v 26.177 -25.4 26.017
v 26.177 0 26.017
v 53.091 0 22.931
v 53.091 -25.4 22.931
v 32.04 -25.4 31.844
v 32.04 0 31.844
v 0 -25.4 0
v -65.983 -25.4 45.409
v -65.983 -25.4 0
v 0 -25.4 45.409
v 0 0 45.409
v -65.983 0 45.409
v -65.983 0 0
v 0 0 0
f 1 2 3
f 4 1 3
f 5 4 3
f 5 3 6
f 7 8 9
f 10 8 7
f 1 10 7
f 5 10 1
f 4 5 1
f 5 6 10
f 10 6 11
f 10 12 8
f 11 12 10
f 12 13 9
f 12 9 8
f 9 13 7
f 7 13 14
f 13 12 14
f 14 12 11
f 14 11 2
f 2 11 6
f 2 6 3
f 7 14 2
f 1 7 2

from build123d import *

# Parameters (mm, degrees)
F0_W     = 65.9830570221
F0_H     = 45.4094596207
F1_DEPTH = 25.4


with BuildPart() as f1:
    # F0 (on Front) → F1 (new body)
    with BuildSketch(Plane.XZ):
        with Locations((-32.991528511, 22.7047298104)):
            Rectangle(F0_W, F0_H)
        Polygon((0, 45.4094596207), (0, 0), (26.1765359093, 26.0169209072), (32.039520707, 31.8441553545), align=None)
        Polygon((32.039520707, 31.8441553545), (26.1765359093, 26.0169209072), (53.0907474458, 22.9312162846), align=None)
    extrude(amount=F1_DEPTH)


solid = f1.part
